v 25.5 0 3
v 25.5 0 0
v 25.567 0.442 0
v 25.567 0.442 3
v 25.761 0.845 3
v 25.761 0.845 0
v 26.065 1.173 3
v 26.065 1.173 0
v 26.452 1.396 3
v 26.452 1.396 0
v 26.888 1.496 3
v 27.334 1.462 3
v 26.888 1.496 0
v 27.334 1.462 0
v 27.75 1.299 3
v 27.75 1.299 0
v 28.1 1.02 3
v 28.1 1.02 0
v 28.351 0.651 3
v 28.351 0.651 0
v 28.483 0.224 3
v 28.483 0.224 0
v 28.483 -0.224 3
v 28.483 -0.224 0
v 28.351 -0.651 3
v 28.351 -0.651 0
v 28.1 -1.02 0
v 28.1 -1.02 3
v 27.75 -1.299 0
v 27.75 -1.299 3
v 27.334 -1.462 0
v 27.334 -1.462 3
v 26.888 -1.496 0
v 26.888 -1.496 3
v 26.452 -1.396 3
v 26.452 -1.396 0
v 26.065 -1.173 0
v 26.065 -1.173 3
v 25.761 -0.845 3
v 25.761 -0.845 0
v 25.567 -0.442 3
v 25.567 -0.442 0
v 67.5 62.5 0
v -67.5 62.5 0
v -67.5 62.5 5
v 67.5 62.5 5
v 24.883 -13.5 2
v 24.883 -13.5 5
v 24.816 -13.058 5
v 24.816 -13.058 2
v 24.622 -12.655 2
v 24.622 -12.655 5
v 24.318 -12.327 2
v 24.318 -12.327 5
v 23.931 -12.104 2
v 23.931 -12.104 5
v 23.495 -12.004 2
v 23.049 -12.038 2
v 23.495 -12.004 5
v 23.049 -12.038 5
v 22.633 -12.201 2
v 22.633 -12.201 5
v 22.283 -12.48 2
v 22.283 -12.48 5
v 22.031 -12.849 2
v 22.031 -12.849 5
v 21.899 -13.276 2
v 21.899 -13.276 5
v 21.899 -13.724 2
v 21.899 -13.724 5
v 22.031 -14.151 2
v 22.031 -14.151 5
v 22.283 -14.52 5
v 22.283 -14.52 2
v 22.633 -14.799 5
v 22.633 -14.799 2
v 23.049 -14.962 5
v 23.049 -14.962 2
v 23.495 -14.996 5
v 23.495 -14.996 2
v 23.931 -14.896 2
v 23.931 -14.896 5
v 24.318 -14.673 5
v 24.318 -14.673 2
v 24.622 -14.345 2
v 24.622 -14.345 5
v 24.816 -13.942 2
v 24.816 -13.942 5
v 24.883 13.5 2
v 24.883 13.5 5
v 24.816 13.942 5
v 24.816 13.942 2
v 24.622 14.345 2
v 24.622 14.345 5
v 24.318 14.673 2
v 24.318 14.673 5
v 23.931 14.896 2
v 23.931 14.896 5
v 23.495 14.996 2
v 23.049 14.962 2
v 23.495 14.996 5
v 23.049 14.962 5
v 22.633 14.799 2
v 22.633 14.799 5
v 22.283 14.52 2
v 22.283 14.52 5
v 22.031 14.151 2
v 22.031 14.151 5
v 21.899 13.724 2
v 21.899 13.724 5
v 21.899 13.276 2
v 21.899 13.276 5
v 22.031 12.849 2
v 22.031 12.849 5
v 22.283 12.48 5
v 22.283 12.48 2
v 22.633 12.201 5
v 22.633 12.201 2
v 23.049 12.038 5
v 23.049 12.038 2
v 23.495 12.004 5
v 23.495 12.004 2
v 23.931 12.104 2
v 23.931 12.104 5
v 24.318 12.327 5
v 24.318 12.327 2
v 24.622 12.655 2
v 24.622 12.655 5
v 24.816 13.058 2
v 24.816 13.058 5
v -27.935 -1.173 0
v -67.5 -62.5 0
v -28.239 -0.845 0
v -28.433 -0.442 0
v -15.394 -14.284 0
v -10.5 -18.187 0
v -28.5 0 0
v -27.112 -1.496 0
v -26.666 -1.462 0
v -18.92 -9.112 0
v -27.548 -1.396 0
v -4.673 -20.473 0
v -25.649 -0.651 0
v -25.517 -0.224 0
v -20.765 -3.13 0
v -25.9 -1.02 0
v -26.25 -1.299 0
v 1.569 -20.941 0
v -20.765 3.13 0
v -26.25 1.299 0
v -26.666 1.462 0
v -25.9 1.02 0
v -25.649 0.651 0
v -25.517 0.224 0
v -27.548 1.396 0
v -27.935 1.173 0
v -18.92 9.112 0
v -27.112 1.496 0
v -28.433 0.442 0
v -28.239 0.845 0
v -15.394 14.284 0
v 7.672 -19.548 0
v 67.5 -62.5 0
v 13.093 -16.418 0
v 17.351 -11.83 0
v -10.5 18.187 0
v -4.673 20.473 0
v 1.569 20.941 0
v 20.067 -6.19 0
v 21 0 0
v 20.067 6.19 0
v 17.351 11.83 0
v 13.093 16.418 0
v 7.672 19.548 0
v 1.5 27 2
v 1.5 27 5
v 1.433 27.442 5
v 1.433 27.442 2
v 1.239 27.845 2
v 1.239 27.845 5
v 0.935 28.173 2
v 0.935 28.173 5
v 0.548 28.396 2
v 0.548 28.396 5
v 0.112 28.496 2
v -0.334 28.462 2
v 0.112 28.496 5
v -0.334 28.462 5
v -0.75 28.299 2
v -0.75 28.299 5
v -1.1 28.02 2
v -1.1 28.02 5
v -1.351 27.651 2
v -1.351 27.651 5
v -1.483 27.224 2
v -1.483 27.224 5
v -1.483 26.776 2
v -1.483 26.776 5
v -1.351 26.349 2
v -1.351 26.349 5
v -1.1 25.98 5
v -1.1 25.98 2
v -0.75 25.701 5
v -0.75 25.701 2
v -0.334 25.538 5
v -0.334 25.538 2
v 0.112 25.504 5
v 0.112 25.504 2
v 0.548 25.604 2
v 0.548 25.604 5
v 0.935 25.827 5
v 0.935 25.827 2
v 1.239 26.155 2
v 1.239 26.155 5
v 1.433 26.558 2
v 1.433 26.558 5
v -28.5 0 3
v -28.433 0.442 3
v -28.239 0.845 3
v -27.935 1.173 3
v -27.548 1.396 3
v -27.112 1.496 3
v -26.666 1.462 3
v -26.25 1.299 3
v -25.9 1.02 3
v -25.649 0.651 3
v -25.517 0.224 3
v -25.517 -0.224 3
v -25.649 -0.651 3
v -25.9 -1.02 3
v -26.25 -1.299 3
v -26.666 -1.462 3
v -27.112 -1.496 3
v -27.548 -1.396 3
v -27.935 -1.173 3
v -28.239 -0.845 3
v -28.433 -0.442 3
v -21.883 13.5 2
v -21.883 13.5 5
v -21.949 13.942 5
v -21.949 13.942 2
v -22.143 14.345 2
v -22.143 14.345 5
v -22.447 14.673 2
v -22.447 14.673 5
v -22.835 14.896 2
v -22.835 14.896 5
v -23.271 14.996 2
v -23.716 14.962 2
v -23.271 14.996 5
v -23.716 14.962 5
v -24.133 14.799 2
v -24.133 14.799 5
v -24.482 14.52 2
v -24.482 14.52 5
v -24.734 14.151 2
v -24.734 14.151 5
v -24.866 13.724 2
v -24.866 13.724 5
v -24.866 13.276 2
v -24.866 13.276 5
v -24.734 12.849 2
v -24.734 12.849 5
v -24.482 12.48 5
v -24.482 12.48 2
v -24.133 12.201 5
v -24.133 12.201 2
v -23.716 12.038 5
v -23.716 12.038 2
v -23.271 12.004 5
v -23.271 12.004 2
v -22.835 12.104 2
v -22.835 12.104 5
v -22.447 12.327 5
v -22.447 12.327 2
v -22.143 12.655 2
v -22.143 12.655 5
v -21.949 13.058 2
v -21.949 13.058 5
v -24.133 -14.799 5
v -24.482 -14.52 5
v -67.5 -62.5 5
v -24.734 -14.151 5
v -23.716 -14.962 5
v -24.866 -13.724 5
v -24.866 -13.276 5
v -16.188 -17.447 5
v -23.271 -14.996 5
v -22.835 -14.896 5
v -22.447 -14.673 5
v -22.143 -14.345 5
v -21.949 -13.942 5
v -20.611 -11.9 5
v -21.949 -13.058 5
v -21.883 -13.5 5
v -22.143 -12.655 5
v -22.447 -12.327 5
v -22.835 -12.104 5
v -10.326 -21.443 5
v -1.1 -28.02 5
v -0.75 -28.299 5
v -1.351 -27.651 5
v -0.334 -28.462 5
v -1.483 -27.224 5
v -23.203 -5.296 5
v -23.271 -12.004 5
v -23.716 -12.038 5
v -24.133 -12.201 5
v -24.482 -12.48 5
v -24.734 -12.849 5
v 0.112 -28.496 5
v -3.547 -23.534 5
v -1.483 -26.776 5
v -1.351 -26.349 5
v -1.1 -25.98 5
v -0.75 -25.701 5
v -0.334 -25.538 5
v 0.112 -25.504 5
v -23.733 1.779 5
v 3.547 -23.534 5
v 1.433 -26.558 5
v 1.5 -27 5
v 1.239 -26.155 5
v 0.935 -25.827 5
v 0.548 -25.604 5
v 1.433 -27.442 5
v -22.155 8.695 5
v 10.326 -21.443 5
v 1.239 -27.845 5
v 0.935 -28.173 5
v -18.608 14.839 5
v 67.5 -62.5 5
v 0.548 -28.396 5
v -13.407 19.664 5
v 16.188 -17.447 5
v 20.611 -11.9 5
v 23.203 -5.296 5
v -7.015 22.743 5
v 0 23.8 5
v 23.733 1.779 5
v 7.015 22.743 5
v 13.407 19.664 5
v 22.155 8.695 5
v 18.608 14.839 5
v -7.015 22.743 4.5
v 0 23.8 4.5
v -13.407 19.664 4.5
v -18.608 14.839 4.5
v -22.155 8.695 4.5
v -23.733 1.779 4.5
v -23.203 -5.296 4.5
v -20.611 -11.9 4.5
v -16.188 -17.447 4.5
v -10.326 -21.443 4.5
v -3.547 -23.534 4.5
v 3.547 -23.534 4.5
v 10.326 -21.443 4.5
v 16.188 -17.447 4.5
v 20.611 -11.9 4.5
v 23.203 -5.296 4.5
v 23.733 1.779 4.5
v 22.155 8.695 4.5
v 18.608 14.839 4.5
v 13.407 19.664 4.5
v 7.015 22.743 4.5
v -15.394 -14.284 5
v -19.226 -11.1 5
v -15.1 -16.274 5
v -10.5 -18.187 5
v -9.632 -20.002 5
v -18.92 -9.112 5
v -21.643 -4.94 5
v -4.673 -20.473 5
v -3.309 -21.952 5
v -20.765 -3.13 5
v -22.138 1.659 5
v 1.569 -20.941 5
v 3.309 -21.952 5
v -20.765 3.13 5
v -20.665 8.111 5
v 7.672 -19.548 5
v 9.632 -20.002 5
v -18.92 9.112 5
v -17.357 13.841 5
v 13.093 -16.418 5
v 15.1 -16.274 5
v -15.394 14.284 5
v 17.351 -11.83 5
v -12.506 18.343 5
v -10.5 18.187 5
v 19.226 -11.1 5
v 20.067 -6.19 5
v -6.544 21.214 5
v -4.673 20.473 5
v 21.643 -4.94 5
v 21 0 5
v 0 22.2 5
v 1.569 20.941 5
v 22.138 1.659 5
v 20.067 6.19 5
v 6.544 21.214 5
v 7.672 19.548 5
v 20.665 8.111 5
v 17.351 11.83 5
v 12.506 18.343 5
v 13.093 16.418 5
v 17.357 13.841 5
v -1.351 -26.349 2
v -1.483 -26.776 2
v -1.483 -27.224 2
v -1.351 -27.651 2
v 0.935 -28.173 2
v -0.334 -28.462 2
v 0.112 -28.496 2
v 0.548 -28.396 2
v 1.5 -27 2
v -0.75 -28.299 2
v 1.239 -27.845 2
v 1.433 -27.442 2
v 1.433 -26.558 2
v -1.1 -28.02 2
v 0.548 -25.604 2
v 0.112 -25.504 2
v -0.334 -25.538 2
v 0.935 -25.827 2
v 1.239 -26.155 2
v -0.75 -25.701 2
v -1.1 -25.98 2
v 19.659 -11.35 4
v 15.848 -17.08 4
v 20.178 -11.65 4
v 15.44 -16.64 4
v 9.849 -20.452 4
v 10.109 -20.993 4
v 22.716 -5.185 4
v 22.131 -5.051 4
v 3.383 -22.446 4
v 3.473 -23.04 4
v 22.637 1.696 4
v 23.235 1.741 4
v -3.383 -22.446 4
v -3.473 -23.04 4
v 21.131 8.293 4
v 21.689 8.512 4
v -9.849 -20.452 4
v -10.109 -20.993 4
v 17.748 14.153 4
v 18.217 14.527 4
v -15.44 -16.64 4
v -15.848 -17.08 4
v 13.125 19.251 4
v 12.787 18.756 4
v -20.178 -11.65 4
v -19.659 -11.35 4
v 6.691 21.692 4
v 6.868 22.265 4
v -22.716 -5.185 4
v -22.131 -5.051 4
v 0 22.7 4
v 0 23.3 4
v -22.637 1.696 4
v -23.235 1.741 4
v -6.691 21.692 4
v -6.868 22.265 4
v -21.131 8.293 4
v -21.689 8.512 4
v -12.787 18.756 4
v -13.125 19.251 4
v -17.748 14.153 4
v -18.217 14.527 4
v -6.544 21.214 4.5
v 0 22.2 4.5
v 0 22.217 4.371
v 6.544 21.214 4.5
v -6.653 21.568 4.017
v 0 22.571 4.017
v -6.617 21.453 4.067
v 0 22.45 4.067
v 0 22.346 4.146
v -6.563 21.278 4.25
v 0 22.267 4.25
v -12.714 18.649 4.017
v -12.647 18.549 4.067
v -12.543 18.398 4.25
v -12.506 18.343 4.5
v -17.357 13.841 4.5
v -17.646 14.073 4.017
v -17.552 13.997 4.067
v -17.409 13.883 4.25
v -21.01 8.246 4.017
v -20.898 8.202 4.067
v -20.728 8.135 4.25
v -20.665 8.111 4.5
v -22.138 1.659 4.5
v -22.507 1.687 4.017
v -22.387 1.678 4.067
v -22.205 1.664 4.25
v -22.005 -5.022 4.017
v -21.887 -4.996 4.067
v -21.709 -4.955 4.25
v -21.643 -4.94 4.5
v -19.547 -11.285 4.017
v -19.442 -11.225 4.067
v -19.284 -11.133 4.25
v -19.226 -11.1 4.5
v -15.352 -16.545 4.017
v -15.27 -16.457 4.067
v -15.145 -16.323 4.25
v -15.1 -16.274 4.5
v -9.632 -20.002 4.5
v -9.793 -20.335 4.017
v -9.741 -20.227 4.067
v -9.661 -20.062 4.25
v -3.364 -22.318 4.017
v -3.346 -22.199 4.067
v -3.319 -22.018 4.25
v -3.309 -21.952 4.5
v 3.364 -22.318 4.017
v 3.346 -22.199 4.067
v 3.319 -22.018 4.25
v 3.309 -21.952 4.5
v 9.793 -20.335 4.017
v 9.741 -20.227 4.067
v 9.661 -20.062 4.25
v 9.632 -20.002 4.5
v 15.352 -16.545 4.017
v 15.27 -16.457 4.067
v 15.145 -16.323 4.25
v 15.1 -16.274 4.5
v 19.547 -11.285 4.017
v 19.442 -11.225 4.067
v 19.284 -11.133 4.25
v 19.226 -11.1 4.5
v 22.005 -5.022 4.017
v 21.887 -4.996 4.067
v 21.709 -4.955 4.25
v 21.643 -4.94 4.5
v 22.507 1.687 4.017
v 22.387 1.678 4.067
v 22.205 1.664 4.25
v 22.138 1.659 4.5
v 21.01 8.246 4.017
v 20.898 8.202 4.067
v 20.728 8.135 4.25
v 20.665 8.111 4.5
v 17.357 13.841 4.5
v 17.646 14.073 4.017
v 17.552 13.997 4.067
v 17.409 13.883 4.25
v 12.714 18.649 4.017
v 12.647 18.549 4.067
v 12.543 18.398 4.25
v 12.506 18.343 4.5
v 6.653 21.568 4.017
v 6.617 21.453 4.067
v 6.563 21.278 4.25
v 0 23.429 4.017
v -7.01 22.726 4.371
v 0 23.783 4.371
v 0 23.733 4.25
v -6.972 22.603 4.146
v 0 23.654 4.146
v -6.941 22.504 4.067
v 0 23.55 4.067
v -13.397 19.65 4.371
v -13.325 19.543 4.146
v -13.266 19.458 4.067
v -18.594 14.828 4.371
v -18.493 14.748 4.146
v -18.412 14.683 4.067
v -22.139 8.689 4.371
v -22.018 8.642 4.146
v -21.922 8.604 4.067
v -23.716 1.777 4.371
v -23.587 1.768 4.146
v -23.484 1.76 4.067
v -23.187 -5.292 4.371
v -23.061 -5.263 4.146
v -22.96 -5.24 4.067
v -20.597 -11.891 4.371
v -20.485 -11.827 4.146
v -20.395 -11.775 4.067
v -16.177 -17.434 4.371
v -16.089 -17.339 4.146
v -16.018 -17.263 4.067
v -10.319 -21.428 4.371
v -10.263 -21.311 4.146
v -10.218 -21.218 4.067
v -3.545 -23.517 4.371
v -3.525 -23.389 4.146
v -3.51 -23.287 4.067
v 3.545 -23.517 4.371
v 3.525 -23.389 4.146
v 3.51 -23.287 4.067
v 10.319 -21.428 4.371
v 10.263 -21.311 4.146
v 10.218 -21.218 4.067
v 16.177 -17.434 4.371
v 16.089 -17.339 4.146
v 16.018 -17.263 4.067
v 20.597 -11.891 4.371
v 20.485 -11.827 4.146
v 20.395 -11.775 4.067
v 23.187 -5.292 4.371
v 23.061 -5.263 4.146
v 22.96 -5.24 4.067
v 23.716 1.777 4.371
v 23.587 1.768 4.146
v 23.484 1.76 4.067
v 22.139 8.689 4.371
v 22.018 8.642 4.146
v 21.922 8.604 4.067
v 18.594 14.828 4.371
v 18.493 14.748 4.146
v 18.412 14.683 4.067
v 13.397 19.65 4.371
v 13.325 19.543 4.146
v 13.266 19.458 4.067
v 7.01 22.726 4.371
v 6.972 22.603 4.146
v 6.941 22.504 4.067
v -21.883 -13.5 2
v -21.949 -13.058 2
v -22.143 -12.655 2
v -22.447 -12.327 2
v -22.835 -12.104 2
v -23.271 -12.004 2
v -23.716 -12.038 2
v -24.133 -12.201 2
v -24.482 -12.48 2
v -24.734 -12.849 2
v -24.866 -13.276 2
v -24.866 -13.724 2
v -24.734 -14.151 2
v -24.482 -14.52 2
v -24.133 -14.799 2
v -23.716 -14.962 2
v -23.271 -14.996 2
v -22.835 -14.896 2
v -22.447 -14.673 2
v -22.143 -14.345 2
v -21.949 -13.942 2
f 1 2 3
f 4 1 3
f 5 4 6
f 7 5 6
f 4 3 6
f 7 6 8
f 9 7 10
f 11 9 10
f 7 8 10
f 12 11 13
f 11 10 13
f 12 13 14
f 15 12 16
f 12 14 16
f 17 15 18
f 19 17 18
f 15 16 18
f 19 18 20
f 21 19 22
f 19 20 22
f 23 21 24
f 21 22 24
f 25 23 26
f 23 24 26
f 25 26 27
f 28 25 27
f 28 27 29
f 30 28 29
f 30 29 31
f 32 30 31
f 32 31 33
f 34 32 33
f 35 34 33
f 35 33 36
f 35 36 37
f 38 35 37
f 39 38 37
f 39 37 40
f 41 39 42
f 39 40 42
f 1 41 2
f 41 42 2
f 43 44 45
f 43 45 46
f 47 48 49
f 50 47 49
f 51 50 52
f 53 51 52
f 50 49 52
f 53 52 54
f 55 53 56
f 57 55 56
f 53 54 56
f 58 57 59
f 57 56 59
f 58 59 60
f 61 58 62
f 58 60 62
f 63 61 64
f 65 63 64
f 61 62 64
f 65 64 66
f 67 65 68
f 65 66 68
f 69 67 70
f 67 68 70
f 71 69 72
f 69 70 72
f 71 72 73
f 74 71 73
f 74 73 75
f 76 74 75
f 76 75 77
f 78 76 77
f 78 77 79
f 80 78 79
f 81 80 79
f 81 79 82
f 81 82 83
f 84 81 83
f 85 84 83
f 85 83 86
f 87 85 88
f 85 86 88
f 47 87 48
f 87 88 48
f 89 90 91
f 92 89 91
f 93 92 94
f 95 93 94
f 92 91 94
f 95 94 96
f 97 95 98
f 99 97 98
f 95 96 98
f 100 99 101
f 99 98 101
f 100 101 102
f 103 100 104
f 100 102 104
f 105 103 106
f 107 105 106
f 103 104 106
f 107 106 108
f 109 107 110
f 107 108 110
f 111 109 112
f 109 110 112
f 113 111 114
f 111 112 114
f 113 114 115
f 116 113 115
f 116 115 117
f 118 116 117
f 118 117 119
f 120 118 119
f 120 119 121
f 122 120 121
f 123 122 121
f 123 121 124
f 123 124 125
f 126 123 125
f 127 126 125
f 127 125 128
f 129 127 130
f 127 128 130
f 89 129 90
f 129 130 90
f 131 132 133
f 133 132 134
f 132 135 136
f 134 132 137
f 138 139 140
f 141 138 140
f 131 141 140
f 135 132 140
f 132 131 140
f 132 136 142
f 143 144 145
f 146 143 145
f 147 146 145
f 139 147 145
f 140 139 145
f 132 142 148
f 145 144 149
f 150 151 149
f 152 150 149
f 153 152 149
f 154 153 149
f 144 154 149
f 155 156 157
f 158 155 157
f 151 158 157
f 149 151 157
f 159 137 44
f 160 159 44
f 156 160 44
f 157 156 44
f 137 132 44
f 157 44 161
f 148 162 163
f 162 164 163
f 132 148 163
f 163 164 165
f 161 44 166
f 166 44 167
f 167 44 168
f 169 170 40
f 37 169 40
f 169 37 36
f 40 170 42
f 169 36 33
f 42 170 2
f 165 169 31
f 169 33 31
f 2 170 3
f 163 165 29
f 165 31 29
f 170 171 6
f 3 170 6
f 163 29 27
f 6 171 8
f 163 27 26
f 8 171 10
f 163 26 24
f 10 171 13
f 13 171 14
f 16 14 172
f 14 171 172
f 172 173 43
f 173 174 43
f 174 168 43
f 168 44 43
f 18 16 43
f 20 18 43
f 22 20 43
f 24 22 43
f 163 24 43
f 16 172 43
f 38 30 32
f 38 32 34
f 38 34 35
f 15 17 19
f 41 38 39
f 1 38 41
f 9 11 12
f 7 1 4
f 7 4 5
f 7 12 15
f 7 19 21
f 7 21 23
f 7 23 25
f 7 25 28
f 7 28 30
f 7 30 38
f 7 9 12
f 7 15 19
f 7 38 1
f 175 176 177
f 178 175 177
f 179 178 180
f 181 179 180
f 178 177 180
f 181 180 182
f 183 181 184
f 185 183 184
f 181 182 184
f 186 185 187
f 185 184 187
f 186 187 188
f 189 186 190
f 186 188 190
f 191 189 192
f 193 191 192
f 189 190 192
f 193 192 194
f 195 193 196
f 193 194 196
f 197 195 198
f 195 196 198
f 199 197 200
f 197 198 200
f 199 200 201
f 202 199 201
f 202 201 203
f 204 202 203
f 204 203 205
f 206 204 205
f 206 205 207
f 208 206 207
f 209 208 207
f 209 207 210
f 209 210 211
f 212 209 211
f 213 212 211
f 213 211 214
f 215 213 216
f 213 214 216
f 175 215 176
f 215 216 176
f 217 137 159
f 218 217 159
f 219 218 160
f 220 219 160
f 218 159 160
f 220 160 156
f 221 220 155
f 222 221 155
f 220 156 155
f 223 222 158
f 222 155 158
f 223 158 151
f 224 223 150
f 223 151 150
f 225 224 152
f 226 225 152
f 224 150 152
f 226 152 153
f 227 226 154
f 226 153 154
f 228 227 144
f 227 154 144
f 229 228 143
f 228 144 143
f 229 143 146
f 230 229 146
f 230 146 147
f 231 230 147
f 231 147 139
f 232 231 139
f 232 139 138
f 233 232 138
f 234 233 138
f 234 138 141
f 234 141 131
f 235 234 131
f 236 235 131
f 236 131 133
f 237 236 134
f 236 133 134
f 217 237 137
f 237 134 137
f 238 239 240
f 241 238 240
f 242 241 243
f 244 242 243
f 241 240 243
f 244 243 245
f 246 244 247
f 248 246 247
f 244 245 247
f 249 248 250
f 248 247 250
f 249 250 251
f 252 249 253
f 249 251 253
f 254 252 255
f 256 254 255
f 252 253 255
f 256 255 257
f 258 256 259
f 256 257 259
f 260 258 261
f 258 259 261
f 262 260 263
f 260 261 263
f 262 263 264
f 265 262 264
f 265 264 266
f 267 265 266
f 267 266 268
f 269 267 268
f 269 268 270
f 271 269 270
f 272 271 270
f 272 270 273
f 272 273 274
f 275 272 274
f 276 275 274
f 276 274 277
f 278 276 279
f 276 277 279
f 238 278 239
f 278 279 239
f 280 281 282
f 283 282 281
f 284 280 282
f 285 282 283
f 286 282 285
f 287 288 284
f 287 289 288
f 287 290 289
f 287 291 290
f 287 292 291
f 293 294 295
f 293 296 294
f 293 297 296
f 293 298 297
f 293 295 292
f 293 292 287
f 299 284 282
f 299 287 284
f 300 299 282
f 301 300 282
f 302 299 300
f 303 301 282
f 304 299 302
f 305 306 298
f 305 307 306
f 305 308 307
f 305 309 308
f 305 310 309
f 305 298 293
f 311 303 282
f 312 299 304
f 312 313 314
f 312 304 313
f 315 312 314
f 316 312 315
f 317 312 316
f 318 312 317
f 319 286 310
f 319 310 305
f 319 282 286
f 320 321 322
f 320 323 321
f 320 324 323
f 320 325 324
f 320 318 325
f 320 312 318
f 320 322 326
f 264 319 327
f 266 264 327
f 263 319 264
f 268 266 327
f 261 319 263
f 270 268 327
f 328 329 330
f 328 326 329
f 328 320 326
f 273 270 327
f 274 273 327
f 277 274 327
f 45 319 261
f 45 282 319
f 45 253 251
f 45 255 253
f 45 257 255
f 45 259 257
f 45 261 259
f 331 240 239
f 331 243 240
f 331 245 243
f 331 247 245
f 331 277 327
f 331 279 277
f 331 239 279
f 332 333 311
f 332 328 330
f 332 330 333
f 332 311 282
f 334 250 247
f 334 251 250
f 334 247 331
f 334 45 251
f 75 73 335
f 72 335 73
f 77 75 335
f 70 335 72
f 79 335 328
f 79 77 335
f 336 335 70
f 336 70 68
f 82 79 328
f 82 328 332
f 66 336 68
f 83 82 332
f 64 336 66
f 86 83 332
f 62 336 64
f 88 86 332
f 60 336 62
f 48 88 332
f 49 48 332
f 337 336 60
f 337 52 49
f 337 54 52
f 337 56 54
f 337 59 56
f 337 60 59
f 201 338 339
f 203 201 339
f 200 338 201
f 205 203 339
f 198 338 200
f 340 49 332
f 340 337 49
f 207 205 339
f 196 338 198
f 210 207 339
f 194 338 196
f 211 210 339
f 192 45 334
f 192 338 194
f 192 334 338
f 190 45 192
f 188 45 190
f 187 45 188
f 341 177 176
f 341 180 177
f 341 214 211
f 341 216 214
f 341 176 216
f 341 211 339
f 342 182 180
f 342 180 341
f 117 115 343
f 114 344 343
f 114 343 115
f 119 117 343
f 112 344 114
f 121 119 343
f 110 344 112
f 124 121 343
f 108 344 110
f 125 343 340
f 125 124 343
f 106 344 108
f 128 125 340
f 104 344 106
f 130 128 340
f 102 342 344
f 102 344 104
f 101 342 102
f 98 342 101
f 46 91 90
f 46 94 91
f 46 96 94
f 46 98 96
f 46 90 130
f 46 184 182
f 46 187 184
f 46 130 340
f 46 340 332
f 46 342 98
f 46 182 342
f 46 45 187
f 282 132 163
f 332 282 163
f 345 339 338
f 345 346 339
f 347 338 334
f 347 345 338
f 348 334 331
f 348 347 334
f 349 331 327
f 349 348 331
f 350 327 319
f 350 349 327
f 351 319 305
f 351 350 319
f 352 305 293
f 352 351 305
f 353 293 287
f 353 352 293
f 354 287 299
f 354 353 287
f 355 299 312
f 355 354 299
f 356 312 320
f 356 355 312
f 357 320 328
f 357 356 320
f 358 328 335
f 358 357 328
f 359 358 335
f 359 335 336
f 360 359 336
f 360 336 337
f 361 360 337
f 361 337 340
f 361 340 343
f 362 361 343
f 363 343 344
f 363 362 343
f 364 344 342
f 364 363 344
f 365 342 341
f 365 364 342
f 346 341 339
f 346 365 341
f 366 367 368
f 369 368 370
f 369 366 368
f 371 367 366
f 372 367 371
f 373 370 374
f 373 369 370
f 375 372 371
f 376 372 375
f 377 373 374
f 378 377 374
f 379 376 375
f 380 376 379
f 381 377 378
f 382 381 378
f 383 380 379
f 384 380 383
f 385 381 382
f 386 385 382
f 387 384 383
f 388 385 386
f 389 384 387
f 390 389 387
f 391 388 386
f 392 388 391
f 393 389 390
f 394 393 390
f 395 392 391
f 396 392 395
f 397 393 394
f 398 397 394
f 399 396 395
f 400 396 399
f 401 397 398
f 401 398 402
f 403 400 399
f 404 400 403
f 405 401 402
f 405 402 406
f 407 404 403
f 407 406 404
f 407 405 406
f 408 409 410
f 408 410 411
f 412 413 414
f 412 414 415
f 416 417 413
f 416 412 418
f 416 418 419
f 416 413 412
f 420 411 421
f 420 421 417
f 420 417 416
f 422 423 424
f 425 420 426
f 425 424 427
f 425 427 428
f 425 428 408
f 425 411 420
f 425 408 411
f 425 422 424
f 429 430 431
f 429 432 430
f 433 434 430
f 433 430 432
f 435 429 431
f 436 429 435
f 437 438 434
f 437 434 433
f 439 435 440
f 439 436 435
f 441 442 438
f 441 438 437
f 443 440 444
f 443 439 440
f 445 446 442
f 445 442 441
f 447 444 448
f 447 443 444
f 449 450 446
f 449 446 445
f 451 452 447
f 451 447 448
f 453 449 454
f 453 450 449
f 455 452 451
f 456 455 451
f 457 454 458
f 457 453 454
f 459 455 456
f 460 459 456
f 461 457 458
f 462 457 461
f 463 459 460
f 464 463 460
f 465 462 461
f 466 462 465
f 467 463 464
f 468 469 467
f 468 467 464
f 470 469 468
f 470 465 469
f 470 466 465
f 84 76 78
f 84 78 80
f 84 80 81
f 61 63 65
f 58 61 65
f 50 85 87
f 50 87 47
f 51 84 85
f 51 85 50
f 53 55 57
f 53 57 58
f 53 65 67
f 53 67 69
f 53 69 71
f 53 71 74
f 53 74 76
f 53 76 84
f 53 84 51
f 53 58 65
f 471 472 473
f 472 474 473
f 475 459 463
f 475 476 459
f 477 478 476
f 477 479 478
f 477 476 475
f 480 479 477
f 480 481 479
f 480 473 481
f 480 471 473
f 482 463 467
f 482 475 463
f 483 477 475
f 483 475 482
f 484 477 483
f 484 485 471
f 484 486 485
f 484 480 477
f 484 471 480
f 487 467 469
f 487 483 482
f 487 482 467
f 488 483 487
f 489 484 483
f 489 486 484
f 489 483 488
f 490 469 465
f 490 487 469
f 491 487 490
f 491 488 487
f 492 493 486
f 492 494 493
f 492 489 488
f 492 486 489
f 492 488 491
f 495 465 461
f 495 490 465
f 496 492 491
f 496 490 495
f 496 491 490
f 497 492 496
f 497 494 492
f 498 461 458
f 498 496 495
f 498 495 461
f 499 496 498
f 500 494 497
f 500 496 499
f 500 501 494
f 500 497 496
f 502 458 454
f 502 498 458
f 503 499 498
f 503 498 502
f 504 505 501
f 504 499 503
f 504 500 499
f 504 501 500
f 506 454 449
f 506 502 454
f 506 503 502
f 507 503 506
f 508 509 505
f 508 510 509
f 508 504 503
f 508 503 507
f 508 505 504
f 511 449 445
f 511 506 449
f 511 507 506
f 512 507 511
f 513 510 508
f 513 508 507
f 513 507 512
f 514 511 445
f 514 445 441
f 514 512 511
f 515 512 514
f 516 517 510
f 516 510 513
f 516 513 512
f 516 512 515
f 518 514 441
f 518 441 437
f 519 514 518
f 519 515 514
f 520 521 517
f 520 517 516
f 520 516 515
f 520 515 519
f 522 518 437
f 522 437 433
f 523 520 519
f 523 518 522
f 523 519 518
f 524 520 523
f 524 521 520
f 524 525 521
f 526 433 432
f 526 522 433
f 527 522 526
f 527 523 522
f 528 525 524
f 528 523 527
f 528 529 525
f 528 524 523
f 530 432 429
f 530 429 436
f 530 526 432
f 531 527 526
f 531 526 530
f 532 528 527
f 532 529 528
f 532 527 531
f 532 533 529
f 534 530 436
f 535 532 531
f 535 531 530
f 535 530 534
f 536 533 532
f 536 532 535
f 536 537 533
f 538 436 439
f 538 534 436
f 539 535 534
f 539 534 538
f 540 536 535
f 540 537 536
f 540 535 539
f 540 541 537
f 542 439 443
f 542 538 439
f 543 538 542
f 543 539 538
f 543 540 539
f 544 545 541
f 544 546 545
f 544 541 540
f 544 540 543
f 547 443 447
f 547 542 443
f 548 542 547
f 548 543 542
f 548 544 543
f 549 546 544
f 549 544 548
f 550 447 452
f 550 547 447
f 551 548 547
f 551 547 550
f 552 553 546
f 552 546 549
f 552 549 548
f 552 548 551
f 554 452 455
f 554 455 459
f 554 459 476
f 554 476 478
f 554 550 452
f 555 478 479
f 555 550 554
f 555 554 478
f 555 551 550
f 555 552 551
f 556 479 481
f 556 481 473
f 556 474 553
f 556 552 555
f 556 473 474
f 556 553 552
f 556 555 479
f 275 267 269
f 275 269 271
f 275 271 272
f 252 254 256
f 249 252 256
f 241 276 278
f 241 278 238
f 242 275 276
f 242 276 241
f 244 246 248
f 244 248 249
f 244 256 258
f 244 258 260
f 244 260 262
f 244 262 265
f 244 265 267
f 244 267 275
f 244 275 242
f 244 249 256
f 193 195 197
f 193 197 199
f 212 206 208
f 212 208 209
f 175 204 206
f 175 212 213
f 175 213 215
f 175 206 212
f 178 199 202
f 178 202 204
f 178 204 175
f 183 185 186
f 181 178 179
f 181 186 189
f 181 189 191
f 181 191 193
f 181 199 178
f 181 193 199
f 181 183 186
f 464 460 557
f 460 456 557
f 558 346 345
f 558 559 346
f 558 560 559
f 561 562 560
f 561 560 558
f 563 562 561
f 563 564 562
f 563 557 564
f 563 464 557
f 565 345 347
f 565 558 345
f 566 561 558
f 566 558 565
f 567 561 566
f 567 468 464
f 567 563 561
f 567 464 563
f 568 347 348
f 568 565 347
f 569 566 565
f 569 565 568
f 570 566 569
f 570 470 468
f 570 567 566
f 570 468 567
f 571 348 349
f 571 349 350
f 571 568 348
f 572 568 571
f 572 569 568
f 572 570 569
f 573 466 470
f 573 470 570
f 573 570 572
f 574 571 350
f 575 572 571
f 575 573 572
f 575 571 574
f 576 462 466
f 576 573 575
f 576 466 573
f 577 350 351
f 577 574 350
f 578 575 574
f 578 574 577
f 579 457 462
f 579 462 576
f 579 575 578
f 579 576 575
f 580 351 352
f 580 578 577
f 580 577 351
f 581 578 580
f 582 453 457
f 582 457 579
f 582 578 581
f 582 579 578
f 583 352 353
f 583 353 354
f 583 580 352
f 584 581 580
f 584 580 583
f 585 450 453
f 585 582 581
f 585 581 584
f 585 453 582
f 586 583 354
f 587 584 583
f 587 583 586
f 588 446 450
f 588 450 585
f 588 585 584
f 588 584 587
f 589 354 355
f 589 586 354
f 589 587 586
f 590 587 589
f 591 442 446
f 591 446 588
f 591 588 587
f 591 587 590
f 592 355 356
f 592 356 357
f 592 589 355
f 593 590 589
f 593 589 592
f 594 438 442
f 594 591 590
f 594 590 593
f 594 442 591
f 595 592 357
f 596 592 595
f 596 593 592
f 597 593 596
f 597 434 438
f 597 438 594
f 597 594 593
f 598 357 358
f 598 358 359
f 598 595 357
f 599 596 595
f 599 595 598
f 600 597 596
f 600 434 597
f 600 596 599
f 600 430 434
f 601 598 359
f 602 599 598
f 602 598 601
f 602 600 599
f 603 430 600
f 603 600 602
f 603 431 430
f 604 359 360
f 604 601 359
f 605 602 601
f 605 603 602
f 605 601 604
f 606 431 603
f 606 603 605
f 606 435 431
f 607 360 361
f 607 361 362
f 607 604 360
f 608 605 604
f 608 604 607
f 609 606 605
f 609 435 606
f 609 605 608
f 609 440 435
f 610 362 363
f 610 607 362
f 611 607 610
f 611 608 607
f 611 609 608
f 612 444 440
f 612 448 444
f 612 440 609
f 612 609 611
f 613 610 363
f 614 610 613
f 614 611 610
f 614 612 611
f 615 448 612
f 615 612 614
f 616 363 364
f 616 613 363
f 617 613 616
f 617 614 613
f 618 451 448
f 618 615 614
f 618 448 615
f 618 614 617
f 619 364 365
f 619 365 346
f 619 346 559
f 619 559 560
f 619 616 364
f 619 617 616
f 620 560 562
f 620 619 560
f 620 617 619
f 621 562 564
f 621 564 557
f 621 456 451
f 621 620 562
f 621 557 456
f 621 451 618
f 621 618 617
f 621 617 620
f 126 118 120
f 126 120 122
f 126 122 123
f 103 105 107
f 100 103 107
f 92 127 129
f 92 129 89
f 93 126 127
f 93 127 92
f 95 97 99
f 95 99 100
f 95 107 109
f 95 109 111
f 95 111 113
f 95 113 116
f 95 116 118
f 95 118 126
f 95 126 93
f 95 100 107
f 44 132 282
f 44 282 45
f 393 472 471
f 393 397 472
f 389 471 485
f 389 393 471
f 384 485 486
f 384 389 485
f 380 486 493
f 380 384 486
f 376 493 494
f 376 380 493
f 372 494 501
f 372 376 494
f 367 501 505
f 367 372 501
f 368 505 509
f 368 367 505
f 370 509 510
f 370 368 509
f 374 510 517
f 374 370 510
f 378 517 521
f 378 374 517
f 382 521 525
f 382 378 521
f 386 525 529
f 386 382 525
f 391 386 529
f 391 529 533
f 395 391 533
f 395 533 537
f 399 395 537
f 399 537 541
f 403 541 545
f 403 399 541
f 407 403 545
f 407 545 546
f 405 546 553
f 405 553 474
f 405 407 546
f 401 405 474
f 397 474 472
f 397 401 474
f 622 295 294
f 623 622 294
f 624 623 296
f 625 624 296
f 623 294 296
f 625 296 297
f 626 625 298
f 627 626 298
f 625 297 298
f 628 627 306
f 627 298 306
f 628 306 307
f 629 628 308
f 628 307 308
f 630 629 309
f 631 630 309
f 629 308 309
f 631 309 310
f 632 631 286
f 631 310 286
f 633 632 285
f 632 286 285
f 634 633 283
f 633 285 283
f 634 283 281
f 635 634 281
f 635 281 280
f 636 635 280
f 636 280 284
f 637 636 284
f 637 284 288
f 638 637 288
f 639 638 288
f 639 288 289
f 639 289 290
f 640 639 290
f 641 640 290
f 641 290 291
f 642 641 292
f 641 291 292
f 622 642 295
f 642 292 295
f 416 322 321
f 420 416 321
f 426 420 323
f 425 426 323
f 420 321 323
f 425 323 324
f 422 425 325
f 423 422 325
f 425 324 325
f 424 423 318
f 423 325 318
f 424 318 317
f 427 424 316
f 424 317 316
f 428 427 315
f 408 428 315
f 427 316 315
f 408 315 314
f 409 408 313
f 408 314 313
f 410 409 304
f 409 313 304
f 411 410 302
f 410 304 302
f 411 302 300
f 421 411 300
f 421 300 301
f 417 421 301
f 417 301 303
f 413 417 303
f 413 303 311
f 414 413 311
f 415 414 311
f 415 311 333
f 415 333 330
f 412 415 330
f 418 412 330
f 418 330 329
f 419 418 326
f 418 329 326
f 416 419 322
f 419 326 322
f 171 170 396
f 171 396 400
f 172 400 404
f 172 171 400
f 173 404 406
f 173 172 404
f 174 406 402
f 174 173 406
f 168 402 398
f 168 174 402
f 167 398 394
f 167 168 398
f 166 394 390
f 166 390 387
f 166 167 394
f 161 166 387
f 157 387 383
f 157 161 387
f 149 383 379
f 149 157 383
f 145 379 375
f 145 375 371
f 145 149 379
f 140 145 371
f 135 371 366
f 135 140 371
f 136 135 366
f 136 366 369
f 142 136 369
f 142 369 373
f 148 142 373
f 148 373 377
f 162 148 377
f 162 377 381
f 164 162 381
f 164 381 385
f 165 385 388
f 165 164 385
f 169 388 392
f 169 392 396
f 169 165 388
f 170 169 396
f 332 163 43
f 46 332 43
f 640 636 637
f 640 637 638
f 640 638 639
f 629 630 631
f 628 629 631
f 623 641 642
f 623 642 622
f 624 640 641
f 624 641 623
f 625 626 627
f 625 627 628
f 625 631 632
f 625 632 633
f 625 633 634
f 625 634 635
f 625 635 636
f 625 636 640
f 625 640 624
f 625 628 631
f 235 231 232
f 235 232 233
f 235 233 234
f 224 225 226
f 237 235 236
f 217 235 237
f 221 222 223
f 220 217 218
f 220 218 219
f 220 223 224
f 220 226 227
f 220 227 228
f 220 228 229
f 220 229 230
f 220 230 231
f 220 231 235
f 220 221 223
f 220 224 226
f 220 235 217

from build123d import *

# Parameters (mm, degrees)
SKETCH1_W           = 135
SKETCH1_H           = 125
SKETCH1_R           = 21
BOSS_EXTRUDE1_DEPTH = 5
CUT_EXTRUDE1_START  = 5
SKETCH1_3_R         = 1.5
CUT_EXTRUDE1_DEPTH  = 3
SKETCH2_R           = 1.5
CUT_EXTRUDE2_DEPTH  = 3


with BuildPart() as part:
    # Sketch1 → Boss-Extrude1 (new body)
    with BuildSketch(Plane.XY):
        Rectangle(SKETCH1_W, SKETCH1_H)
        Circle(SKETCH1_R, mode=Mode.SUBTRACT)
    extrude(amount=BOSS_EXTRUDE1_DEPTH)

    # Sketch1<3> → Cut-Extrude1 (cut)
    with BuildSketch(Plane.XY.offset(CUT_EXTRUDE1_START)):
        with Locations((0, 27)):
            Circle(SKETCH1_3_R)
        with Locations((23.382685902, 13.5)):
            Circle(SKETCH1_3_R)
        with Locations((23.382685902, -13.5)):
            Circle(SKETCH1_3_R)
        with Locations((0, -27)):
            Circle(SKETCH1_3_R)
        with Locations((-23.382685902, -13.5)):
            Circle(SKETCH1_3_R)
        with Locations((-23.382685902, 13.5)):
            Circle(SKETCH1_3_R)
    extrude(amount=-CUT_EXTRUDE1_DEPTH, mode=Mode.SUBTRACT)

    # Sketch2 → Cut-Extrude2 (cut)
    with BuildSketch(Plane(origin=(0, 0, 0), x_dir=(-1, 0, 0), z_dir=(0, 0, -1))):
        with Locations((27, 0)):
            Circle(SKETCH2_R)
        with Locations((-27, 0)):
            Circle(SKETCH2_R)
    extrude(amount=-CUT_EXTRUDE2_DEPTH, mode=Mode.SUBTRACT)

    # Sketch3 → Cut-Revolve1 (revolve, cut)
    with BuildSketch(Plane(origin=(0, 0, 0), x_dir=(0, 0, -1), z_dir=(1, 0, 0))):
        with BuildLine():
            Line((-5, 23.8), (-4.5, 23.8))
            ThreePointArc((-4.5, 23.8), (-4.146446609, 23.653553391), (-4, 23.3))
            Line((-4, 23.3), (-4, 22.7))
            ThreePointArc((-4, 22.7), (-4.146446609, 22.346446609), (-4.5, 22.2))
            Line((-4.5, 22.2), (-5, 22.2))
            Line((-5, 22.2), (-5, 23.8))
        make_face()
    revolve(axis=Axis((0, 0, 0), (0, 0, 1)), mode=Mode.SUBTRACT)


solid = part.part
